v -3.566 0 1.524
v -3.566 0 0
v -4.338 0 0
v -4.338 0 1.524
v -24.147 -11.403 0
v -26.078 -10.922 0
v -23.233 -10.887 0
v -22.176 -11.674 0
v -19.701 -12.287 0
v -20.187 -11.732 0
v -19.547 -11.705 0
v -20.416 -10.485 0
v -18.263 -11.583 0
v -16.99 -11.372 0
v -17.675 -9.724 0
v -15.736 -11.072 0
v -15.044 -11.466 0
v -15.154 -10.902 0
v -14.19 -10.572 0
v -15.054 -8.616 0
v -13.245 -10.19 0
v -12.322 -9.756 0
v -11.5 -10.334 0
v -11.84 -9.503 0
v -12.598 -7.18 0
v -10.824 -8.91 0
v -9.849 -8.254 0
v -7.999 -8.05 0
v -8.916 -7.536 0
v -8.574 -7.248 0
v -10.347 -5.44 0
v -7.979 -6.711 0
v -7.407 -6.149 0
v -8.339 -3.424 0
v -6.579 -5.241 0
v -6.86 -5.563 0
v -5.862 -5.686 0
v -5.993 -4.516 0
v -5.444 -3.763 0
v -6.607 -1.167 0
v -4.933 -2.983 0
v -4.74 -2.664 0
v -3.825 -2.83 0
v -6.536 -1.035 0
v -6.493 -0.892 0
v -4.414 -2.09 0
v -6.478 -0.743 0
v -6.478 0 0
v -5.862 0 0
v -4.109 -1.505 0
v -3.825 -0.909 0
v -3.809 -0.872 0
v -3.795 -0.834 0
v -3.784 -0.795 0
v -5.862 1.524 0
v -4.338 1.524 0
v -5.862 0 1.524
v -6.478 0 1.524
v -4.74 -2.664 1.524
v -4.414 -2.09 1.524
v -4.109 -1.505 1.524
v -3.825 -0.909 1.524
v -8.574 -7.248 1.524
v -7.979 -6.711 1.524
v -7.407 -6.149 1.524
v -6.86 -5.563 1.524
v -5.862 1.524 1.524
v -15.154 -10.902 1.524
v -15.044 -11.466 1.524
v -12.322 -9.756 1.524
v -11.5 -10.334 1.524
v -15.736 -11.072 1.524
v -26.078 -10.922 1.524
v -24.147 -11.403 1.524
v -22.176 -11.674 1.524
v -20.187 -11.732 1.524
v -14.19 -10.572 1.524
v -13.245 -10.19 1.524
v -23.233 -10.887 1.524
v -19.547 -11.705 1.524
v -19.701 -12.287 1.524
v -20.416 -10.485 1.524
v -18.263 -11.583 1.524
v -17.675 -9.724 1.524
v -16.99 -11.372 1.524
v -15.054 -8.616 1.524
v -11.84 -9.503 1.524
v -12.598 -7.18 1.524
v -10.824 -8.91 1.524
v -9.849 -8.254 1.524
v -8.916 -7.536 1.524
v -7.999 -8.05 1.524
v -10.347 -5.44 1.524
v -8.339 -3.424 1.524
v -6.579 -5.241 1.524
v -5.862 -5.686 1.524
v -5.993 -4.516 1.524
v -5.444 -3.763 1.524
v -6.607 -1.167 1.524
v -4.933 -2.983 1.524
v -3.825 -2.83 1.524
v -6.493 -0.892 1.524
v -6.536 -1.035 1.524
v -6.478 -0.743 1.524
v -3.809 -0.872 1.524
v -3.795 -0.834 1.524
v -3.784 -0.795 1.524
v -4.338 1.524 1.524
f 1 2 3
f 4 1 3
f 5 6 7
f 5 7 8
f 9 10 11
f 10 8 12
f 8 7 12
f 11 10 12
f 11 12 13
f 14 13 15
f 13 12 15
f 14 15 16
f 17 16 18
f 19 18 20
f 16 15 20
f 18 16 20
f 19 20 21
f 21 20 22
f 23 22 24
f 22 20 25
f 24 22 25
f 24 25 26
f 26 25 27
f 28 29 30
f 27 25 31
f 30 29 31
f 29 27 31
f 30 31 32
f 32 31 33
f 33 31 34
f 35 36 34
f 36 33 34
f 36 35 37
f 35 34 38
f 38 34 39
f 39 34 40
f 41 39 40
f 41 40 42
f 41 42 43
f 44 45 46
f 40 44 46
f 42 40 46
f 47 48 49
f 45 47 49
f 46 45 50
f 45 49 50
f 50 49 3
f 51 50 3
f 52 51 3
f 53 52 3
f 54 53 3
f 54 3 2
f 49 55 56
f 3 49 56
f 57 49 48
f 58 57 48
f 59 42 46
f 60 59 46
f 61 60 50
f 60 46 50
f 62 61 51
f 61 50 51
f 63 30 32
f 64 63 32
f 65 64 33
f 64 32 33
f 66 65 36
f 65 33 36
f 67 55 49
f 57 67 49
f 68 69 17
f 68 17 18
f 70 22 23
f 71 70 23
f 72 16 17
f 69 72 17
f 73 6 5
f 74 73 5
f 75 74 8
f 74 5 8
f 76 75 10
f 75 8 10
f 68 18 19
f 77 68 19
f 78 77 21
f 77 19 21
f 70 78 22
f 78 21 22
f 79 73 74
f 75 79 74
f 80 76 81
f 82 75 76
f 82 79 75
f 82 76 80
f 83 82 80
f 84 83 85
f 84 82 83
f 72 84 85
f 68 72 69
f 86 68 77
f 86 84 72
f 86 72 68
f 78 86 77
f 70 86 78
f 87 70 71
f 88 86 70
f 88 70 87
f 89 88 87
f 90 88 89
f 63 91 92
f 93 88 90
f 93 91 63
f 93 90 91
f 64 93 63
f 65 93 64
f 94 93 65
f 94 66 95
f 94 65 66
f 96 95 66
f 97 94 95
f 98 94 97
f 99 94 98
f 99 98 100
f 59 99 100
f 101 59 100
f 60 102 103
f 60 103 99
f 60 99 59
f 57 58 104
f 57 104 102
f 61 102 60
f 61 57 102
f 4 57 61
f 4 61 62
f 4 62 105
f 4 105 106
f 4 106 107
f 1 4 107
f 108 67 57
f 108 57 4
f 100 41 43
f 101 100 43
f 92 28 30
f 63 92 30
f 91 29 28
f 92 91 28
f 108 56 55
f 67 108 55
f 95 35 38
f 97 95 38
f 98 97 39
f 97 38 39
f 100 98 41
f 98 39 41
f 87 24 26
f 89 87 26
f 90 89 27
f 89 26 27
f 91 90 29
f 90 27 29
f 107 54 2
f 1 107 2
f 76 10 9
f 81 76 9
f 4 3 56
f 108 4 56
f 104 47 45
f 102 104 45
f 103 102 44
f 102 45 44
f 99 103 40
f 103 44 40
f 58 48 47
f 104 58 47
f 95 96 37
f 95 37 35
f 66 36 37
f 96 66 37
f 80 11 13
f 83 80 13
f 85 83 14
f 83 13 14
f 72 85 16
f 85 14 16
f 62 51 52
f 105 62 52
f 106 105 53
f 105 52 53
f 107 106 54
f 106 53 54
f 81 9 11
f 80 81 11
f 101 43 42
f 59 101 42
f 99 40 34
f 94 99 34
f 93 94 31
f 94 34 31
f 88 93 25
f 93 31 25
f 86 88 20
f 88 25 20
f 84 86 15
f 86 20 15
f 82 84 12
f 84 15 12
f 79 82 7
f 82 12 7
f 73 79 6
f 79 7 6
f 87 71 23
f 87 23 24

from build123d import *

# Parameters (mm, degrees)
BOSS_EXTRUDE1_DEPTH = 1.524


with BuildPart() as part:
    # Sketch1 → Boss-Extrude1 (new body)
    with BuildSketch(Plane.XY):
        with BuildLine():
            Line((-4.3376529, 0), (-4.3376529, 1.524))
            Line((-4.3376529, 1.524), (-5.8616529, 1.524))
            Line((-5.8616529, 1.524), (-5.8616529, 0))
            Line((-5.8616529, 0), (-6.478290939, 0))
            Line((-6.478290939, 0), (-6.478290939, -0.743115039))
            ThreePointArc((-6.478290939, -0.743115039), (-6.511193249, -0.964611222), (-6.60705881, -1.166979488))
            ThreePointArc((-6.60705881, -1.166979488), (-15.054242265, -8.616097958), (-26.078104852, -10.922334716))
            ThreePointArc((-26.078104852, -10.922334716), (-23.165548821, -11.565461887), (-20.18747251, -11.731764839))
            Line((-20.18747251, -11.731764839), (-19.700670178, -12.287185002))
            Line((-19.700670178, -12.287185002), (-19.547051581, -11.704642596))
            ThreePointArc((-19.547051581, -11.704642596), (-17.624782342, -11.488416043), (-15.735636356, -11.072482882))
            Line((-15.735636356, -11.072482882), (-15.043782744, -11.466191113))
            Line((-15.043782744, -11.466191113), (-15.154372523, -10.901903689))
            ThreePointArc((-15.154372523, -10.901903689), (-13.71444875, -10.38734424), (-12.321981989, -9.755530806))
            Line((-12.321981989, -9.755530806), (-11.499632126, -10.334098846))
            Line((-11.499632126, -10.334098846), (-11.840203527, -9.503461421))
            ThreePointArc((-11.840203527, -9.503461421), (-10.331263681, -8.589737909), (-8.916295851, -7.536335727))
            Line((-8.916295851, -7.536335727), (-7.998857494, -8.049594043))
            Line((-7.998857494, -8.049594043), (-8.574085726, -7.248219572))
            ThreePointArc((-8.574085726, -7.248219572), (-7.68975334, -6.433548021), (-6.860257429, -5.563105582))
            Line((-6.860257429, -5.563105582), (-5.8616529, -5.685853343))
            Line((-5.8616529, -5.685853343), (-6.578924281, -5.240527193))
            ThreePointArc((-6.578924281, -5.240527193), (-5.71334828, -4.14305213), (-4.933175939, -2.983308863))
            Line((-4.933175939, -2.983308863), (-3.82490487, -2.830476181))
            Line((-3.82490487, -2.830476181), (-4.739829013, -2.663849113))
            ThreePointArc((-4.739829013, -2.663849113), (-4.258864728, -1.798680626), (-3.82490487, -0.909005407))
            ThreePointArc((-3.82490487, -0.909005407), (-3.801959849, -0.852730225), (-3.783572445, -0.794805504))
            Line((-3.783572445, -0.794805504), (-3.565751855, 0))
            Line((-3.565751855, 0), (-4.3376529, 0))
        make_face()
    extrude(amount=BOSS_EXTRUDE1_DEPTH)


solid = part.part
